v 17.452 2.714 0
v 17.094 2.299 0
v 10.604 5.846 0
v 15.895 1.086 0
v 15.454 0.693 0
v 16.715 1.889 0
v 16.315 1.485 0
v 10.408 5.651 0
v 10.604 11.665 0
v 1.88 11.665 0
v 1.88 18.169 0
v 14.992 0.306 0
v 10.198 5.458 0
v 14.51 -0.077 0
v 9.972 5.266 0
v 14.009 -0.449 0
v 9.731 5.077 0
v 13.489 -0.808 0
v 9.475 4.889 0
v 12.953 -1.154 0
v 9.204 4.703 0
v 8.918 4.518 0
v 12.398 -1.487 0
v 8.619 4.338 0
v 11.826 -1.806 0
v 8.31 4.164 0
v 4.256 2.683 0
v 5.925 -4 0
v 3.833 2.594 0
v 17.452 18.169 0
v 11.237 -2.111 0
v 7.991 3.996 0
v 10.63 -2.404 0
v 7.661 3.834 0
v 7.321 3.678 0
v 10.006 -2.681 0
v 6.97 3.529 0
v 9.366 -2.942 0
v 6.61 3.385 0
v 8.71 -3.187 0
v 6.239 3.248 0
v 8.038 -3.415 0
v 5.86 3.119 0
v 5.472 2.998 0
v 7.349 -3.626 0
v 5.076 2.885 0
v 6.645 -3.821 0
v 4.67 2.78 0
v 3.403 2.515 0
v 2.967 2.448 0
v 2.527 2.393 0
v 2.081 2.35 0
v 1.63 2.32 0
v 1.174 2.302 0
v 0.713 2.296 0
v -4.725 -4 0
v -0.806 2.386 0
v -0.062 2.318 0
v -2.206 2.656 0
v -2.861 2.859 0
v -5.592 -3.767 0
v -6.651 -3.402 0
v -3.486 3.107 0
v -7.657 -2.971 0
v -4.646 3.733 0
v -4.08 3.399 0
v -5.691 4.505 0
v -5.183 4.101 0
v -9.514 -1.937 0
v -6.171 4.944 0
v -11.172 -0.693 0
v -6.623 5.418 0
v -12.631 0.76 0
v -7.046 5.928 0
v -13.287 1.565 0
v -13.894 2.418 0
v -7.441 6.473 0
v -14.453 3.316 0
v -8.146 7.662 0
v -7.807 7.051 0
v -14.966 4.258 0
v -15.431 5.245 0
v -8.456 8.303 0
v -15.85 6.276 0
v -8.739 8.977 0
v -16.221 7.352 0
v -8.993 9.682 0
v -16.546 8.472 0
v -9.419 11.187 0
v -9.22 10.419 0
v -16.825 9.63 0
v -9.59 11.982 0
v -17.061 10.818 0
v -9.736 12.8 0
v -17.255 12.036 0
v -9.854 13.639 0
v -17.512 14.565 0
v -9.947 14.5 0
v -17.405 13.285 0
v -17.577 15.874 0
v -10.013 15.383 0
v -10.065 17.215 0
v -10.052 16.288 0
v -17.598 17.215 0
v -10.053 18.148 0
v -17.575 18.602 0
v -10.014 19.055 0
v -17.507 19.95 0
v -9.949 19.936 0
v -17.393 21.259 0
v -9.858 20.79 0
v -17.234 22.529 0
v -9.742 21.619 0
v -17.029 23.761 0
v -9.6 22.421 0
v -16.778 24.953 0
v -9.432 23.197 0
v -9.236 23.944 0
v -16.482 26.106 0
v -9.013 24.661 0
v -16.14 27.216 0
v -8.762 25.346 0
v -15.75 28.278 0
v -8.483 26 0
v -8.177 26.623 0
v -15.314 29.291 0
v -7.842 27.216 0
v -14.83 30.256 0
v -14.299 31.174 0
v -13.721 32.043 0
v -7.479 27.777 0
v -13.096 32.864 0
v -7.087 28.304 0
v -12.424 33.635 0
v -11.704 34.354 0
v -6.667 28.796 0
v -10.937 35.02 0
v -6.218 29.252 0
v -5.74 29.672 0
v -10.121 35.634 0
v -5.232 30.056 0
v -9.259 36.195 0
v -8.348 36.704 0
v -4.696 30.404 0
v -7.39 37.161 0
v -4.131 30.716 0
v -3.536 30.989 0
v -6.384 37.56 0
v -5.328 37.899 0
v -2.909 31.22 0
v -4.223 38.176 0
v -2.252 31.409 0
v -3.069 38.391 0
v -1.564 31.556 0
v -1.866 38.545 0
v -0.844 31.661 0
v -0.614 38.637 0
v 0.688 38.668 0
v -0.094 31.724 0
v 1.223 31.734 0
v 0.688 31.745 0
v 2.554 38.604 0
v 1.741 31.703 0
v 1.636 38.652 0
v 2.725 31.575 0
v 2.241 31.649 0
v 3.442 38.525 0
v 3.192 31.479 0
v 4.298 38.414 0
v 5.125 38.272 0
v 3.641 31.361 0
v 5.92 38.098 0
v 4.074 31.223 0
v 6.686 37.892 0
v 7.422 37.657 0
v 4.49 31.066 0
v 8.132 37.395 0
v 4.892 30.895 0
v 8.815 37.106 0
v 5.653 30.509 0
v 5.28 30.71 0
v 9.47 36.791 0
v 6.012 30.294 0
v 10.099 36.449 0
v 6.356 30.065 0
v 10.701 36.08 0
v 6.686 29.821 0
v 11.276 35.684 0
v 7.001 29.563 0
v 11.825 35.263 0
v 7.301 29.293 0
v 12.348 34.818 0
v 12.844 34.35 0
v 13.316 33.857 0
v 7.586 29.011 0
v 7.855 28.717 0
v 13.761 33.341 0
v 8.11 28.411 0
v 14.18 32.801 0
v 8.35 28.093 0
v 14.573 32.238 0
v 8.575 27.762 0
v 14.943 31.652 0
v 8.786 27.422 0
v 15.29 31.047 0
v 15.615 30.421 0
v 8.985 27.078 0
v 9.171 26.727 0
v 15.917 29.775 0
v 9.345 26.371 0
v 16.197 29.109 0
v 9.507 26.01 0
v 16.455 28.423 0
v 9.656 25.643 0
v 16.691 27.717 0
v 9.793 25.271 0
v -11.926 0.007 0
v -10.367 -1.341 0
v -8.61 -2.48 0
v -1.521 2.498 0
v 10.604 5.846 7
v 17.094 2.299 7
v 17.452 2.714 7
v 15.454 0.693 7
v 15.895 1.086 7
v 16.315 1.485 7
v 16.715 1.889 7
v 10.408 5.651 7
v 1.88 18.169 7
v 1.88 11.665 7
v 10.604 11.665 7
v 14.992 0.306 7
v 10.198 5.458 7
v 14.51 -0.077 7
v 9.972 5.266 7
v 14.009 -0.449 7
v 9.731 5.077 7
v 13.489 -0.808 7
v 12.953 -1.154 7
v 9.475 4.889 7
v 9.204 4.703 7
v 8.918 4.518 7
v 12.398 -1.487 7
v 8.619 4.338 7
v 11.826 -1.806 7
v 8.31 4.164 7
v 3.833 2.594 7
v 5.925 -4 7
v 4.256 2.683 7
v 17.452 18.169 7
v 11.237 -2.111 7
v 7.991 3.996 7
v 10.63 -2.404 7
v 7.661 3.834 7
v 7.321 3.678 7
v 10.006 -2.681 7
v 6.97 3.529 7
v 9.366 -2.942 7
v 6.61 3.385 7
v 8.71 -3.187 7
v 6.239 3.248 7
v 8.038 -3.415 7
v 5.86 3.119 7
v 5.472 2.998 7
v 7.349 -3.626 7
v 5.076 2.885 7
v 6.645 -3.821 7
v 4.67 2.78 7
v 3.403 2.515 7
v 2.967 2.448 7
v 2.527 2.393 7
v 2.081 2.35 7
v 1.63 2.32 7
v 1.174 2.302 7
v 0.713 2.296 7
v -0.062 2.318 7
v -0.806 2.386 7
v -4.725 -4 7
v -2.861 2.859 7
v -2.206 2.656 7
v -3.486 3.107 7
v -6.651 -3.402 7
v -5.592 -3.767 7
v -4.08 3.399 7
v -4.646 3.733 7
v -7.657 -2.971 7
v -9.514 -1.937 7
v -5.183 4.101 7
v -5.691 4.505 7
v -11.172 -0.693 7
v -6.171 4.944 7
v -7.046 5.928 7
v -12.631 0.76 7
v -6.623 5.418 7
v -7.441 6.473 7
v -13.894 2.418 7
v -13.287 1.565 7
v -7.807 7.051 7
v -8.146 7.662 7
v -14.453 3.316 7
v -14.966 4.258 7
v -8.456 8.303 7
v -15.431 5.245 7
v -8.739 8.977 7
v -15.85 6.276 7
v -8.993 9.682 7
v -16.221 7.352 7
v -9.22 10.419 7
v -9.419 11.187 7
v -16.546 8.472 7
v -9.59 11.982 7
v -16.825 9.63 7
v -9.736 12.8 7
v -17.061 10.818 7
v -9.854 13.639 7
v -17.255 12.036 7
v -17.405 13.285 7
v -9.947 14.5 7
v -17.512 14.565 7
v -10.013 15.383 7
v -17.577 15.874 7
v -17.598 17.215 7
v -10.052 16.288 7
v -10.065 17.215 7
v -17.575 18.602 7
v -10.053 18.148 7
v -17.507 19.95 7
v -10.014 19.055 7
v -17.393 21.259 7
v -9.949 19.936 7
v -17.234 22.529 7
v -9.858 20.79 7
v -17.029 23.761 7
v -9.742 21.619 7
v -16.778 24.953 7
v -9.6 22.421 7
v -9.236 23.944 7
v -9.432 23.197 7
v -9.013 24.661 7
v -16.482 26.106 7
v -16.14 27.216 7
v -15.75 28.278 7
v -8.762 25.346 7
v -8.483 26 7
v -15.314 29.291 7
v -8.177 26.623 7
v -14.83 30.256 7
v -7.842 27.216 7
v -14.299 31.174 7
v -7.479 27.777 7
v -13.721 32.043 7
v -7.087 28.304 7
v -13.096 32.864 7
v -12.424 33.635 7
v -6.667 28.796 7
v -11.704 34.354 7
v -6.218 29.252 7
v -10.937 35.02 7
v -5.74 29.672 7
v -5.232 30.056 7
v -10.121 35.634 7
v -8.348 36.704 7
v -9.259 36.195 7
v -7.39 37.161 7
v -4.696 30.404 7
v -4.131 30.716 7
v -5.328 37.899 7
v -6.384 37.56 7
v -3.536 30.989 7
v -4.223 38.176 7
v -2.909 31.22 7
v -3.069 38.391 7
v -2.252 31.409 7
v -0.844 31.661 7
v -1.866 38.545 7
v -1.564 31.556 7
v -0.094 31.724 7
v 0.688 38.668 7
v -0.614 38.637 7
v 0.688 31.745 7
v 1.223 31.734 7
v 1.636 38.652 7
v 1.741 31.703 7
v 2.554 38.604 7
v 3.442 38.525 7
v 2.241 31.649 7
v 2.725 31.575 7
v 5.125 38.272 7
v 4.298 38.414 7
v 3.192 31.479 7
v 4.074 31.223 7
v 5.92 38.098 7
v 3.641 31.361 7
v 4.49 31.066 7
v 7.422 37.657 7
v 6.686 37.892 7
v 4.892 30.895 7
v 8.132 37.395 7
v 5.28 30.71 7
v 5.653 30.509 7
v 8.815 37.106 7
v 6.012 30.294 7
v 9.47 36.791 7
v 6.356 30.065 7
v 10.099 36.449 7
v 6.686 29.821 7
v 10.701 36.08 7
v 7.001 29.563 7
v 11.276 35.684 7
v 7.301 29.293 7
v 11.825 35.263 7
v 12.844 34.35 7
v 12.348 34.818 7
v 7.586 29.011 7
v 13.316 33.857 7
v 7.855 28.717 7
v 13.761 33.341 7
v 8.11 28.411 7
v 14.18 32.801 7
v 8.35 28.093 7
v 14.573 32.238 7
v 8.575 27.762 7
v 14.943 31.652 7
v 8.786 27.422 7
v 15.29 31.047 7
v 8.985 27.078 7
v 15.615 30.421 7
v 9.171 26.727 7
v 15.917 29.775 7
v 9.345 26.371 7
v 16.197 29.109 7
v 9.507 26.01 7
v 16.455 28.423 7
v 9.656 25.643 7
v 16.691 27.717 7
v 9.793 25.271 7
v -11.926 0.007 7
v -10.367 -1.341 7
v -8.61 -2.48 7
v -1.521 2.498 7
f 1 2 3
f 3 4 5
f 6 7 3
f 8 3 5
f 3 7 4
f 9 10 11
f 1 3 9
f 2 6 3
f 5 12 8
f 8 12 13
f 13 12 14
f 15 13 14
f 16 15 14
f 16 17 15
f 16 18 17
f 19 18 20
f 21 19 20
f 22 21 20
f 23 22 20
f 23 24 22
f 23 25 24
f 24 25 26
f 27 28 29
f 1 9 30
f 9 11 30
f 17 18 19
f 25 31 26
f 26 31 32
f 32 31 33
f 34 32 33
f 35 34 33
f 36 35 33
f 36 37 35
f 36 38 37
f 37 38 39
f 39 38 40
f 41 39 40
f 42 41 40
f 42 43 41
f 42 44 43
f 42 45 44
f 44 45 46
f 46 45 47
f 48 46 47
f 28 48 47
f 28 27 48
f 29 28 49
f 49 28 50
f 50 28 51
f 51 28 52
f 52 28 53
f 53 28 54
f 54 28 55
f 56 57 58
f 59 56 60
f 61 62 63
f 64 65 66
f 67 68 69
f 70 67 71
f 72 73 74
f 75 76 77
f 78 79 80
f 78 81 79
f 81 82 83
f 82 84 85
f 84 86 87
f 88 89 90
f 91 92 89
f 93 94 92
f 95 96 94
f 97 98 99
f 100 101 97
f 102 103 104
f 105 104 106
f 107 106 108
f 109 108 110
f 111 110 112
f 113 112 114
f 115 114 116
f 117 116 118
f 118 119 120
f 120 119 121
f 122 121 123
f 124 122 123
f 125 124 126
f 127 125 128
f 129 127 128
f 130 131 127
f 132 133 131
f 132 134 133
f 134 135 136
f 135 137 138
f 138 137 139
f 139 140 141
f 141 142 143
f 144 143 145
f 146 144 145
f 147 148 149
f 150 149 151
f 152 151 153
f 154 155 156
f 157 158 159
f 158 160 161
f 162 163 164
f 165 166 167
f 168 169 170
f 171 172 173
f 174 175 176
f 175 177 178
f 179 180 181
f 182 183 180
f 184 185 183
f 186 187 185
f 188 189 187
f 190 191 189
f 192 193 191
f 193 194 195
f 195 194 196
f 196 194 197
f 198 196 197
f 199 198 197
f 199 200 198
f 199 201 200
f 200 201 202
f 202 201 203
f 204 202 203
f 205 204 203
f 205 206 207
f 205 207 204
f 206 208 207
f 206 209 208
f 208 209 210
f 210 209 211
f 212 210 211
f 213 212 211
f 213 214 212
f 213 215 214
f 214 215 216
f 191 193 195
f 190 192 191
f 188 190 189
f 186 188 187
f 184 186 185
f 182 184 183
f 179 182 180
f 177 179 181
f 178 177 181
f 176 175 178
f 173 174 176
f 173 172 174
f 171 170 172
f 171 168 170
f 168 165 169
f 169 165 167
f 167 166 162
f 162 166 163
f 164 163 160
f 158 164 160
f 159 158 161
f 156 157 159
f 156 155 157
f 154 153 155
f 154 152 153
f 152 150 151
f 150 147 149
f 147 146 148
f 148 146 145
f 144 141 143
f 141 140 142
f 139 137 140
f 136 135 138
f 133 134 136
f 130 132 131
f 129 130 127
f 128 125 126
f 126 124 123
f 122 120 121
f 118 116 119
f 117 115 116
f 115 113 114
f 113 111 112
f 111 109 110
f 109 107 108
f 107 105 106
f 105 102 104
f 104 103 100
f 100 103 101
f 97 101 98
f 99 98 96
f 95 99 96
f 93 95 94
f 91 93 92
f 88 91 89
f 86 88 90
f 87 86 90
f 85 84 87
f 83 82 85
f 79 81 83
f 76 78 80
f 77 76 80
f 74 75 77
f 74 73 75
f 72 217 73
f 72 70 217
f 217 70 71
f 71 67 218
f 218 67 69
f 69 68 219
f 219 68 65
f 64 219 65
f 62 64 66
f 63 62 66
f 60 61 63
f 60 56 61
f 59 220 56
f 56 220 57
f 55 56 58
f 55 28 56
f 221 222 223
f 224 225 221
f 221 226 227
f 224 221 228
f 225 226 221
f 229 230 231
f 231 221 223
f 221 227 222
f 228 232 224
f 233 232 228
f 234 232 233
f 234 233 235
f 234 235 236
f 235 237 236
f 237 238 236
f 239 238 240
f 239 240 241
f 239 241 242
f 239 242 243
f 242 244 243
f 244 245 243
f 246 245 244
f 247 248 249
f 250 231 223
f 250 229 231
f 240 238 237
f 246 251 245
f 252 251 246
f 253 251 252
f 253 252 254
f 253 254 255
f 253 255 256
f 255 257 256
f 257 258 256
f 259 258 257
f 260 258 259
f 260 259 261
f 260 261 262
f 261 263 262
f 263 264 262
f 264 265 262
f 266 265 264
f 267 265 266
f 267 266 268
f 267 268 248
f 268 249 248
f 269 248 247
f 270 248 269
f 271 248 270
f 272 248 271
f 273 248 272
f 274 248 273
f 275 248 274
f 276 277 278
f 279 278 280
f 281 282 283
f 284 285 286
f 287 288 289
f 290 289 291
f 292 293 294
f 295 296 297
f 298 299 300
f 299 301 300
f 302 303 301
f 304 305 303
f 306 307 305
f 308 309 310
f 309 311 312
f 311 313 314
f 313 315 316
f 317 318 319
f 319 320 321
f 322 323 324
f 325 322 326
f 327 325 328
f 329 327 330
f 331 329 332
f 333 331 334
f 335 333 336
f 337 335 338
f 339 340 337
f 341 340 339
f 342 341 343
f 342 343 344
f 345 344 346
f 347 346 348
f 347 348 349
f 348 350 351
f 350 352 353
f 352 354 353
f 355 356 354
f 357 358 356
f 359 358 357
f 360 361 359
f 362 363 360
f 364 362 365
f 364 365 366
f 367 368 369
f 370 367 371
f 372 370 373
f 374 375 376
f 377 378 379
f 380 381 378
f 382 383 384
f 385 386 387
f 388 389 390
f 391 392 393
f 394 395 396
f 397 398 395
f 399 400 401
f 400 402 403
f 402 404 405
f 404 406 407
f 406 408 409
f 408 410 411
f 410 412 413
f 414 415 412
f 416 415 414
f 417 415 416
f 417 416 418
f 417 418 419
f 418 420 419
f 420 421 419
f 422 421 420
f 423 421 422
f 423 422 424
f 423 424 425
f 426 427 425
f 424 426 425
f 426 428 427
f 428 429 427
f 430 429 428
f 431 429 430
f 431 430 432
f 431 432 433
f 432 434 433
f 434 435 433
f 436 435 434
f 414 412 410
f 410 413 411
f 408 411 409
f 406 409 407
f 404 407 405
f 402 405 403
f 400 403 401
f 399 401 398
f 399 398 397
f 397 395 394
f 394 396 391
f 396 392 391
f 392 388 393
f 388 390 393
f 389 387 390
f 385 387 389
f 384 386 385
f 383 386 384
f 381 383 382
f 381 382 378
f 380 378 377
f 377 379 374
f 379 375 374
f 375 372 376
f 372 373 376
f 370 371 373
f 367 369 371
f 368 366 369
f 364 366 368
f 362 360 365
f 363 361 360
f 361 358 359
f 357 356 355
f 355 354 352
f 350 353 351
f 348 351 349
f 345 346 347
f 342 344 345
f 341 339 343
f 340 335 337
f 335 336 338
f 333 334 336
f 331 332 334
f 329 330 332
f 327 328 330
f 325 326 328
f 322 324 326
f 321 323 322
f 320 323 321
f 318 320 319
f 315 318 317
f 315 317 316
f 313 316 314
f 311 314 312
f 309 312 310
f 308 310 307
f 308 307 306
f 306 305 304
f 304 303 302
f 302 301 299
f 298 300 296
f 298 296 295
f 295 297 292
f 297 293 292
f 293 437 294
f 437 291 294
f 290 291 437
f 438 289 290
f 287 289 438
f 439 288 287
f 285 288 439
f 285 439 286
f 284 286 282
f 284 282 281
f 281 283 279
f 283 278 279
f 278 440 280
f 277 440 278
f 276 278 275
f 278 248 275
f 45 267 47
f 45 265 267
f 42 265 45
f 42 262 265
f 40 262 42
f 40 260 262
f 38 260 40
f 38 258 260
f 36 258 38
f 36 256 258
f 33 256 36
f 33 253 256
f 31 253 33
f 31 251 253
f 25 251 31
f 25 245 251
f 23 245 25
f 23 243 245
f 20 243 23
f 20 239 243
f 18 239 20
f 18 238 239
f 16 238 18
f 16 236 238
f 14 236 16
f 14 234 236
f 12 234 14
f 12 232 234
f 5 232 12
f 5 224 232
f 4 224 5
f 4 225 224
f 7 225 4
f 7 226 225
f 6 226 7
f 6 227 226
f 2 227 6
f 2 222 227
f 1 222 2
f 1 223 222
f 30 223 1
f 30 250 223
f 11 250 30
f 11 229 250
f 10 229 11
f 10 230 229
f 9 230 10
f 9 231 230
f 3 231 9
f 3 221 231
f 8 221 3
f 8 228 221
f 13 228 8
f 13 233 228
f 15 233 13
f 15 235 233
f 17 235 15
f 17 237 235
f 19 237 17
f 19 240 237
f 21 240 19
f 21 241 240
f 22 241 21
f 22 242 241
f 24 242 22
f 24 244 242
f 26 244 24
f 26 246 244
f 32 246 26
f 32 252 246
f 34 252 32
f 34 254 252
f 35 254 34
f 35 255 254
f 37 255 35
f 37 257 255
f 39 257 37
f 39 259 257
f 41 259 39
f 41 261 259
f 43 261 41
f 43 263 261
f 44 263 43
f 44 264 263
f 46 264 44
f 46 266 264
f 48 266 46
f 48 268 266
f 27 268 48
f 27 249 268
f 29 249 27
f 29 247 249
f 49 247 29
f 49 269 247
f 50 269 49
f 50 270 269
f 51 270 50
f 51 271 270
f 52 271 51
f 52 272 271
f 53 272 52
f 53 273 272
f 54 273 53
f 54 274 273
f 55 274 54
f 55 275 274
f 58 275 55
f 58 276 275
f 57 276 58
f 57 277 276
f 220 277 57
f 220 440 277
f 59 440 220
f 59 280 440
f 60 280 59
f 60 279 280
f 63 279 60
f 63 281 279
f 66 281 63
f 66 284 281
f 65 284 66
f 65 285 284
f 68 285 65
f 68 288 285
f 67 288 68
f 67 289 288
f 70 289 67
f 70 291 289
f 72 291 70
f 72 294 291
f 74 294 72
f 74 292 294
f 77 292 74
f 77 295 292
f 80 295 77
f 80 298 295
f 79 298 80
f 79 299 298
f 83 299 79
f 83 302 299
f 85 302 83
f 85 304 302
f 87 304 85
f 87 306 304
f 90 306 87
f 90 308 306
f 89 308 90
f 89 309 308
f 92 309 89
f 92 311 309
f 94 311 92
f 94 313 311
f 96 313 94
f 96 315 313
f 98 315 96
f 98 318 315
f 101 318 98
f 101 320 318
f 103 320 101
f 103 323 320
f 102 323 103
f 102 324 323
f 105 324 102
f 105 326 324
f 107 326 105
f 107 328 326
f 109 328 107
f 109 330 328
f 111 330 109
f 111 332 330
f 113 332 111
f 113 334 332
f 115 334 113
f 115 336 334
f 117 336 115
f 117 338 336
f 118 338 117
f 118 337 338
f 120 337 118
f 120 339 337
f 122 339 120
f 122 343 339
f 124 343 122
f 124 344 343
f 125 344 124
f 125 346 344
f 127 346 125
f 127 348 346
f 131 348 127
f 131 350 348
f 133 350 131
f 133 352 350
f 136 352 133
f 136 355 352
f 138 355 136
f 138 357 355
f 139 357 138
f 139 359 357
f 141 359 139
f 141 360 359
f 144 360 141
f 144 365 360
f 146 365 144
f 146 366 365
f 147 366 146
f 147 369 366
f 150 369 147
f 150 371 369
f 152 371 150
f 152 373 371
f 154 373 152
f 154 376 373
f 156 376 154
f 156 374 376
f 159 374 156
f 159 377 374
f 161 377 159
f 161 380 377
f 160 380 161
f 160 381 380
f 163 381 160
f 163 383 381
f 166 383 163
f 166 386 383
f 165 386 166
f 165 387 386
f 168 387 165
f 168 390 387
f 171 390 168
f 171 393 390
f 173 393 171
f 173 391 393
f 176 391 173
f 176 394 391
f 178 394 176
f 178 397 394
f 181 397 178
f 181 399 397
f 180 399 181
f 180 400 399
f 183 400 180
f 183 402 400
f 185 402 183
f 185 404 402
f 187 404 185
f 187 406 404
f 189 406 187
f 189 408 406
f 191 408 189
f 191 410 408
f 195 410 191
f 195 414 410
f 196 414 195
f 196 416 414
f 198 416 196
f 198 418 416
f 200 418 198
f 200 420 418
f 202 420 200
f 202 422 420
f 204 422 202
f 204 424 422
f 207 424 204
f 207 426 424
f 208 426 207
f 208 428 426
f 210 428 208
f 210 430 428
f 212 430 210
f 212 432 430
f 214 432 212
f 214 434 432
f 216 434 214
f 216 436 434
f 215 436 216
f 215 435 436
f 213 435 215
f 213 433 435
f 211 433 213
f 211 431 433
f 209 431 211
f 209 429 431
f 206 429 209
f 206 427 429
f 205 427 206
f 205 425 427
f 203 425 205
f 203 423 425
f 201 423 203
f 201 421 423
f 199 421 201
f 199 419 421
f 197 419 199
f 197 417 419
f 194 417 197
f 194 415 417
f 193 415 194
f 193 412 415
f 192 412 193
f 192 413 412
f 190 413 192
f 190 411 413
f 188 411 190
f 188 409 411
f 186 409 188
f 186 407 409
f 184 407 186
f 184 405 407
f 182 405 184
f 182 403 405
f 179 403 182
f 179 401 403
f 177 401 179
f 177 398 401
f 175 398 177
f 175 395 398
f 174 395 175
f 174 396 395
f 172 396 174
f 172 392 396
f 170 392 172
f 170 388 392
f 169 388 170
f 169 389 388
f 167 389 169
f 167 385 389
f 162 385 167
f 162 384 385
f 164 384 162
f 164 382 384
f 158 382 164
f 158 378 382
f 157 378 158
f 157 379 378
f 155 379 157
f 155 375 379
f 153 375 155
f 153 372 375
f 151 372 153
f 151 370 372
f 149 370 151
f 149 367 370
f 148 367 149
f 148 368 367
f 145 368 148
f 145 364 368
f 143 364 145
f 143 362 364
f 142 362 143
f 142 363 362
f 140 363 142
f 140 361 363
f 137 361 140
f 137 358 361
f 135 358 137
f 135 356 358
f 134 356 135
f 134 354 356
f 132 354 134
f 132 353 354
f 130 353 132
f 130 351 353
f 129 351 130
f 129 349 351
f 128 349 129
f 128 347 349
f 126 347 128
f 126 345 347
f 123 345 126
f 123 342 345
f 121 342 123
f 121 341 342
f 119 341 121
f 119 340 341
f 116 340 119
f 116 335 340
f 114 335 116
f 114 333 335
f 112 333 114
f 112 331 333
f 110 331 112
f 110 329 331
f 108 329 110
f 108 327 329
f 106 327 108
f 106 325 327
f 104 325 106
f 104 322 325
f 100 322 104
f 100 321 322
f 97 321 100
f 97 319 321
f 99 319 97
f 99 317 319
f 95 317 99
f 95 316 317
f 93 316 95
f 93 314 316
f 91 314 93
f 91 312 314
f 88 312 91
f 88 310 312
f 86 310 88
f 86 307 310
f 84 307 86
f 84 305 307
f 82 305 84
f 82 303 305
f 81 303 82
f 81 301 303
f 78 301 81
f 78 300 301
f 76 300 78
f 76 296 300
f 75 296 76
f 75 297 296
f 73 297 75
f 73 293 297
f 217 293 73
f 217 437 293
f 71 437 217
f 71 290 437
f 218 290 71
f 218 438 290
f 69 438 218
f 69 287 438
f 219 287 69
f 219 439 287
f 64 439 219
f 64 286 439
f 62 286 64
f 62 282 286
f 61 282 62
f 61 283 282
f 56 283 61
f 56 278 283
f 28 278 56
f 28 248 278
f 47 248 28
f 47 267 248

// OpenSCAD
// file: glyph.scad
// glyph — the shared geometry of every letter in the set. Defines named geometry
// only, so it renders nothing on its own; each letter part includes it and calls
// letter(). Every dimension lives in ../../lib/common.scad.
//
// A LETTER IS NOTHING BUT A LETTER. No plinth, no tongue, no tab — it is the
// bare glyph, and it attaches by standing in the deck groove and resting on the
// groove's floor. Anything else on it would be a distraction on a learning toy.
//
// It is a flat plate of one thickness, printed face-down: no overhang anywhere,
// no supports, and the face on the bed comes out smoothest.
//
// TWO TRAPS WITH text():
//
//  * A missing font FALLS BACK SILENTLY — no warning, no error, just different
//    letters. "Liberation Sans" was the first choice here because OpenSCAD
//    bundles it; on macOS the bundled faces are not registered with fontconfig,
//    so it rendered the fallback face instead and nothing said so. To check a
//    font resolved, render a string with it and with a deliberately bogus name
//    and compare bounding boxes: identical means it fell back.
//  * `size` is not the cap height in general. For Helvetica Bold they coincide
//    (size 44 -> 44.0 mm cap), which is why letter_size reads as a height.
//    Change the font and re-measure.

include <../../lib/common.scad>

// The letter's outline, upright in the XY plane, ready to be extruded along Z
// (which is the letter's thickness, and the print's build axis).
//
//   y = 0   is the deck surface
//   y < 0   is the part standing down inside the groove. It reaches letter_bury,
//           which is where the tapered groove closes to letter_t — NOT the
//           groove's floor. The letter wedges; it never bottoms out.
module glyph_2d(ch) {
    intersection() {
        translate([0, -letter_bury])
            scale([letter_condense, 1])
                text(ch, size = letter_size, font = letter_font,
                     halign = "center", valign = "baseline");
        // Trimmed flat at the baseline. Round letters (O, C, G, S) overshoot the
        // baseline by design, and a letter standing on a convex curve rocks —
        // there is nothing to stop it leaning. The trim costs nothing visible
        // and gives every letter a flat foot on the groove floor.
        translate([-200, -letter_bury]) square([400, 400]);
    }
}

// One letter, in its print orientation: lying on its face, thickness up Z.
module letter(ch) {
    linear_extrude(letter_t) glyph_2d(ch);
}

// Where that letter sits once it is dropped into a chassis, for fit checks.
module letter_fitted(ch) {
    translate([0, letter_t/2, body_top]) rotate([90, 0, 0]) letter(ch);
}
// main file
// letter G — one part. See glyph.scad for the geometry and lib/common.scad for
// the dimensions. Prints lying on its face, exactly as exported: no supports.

include <glyph.scad>

letter("G");
